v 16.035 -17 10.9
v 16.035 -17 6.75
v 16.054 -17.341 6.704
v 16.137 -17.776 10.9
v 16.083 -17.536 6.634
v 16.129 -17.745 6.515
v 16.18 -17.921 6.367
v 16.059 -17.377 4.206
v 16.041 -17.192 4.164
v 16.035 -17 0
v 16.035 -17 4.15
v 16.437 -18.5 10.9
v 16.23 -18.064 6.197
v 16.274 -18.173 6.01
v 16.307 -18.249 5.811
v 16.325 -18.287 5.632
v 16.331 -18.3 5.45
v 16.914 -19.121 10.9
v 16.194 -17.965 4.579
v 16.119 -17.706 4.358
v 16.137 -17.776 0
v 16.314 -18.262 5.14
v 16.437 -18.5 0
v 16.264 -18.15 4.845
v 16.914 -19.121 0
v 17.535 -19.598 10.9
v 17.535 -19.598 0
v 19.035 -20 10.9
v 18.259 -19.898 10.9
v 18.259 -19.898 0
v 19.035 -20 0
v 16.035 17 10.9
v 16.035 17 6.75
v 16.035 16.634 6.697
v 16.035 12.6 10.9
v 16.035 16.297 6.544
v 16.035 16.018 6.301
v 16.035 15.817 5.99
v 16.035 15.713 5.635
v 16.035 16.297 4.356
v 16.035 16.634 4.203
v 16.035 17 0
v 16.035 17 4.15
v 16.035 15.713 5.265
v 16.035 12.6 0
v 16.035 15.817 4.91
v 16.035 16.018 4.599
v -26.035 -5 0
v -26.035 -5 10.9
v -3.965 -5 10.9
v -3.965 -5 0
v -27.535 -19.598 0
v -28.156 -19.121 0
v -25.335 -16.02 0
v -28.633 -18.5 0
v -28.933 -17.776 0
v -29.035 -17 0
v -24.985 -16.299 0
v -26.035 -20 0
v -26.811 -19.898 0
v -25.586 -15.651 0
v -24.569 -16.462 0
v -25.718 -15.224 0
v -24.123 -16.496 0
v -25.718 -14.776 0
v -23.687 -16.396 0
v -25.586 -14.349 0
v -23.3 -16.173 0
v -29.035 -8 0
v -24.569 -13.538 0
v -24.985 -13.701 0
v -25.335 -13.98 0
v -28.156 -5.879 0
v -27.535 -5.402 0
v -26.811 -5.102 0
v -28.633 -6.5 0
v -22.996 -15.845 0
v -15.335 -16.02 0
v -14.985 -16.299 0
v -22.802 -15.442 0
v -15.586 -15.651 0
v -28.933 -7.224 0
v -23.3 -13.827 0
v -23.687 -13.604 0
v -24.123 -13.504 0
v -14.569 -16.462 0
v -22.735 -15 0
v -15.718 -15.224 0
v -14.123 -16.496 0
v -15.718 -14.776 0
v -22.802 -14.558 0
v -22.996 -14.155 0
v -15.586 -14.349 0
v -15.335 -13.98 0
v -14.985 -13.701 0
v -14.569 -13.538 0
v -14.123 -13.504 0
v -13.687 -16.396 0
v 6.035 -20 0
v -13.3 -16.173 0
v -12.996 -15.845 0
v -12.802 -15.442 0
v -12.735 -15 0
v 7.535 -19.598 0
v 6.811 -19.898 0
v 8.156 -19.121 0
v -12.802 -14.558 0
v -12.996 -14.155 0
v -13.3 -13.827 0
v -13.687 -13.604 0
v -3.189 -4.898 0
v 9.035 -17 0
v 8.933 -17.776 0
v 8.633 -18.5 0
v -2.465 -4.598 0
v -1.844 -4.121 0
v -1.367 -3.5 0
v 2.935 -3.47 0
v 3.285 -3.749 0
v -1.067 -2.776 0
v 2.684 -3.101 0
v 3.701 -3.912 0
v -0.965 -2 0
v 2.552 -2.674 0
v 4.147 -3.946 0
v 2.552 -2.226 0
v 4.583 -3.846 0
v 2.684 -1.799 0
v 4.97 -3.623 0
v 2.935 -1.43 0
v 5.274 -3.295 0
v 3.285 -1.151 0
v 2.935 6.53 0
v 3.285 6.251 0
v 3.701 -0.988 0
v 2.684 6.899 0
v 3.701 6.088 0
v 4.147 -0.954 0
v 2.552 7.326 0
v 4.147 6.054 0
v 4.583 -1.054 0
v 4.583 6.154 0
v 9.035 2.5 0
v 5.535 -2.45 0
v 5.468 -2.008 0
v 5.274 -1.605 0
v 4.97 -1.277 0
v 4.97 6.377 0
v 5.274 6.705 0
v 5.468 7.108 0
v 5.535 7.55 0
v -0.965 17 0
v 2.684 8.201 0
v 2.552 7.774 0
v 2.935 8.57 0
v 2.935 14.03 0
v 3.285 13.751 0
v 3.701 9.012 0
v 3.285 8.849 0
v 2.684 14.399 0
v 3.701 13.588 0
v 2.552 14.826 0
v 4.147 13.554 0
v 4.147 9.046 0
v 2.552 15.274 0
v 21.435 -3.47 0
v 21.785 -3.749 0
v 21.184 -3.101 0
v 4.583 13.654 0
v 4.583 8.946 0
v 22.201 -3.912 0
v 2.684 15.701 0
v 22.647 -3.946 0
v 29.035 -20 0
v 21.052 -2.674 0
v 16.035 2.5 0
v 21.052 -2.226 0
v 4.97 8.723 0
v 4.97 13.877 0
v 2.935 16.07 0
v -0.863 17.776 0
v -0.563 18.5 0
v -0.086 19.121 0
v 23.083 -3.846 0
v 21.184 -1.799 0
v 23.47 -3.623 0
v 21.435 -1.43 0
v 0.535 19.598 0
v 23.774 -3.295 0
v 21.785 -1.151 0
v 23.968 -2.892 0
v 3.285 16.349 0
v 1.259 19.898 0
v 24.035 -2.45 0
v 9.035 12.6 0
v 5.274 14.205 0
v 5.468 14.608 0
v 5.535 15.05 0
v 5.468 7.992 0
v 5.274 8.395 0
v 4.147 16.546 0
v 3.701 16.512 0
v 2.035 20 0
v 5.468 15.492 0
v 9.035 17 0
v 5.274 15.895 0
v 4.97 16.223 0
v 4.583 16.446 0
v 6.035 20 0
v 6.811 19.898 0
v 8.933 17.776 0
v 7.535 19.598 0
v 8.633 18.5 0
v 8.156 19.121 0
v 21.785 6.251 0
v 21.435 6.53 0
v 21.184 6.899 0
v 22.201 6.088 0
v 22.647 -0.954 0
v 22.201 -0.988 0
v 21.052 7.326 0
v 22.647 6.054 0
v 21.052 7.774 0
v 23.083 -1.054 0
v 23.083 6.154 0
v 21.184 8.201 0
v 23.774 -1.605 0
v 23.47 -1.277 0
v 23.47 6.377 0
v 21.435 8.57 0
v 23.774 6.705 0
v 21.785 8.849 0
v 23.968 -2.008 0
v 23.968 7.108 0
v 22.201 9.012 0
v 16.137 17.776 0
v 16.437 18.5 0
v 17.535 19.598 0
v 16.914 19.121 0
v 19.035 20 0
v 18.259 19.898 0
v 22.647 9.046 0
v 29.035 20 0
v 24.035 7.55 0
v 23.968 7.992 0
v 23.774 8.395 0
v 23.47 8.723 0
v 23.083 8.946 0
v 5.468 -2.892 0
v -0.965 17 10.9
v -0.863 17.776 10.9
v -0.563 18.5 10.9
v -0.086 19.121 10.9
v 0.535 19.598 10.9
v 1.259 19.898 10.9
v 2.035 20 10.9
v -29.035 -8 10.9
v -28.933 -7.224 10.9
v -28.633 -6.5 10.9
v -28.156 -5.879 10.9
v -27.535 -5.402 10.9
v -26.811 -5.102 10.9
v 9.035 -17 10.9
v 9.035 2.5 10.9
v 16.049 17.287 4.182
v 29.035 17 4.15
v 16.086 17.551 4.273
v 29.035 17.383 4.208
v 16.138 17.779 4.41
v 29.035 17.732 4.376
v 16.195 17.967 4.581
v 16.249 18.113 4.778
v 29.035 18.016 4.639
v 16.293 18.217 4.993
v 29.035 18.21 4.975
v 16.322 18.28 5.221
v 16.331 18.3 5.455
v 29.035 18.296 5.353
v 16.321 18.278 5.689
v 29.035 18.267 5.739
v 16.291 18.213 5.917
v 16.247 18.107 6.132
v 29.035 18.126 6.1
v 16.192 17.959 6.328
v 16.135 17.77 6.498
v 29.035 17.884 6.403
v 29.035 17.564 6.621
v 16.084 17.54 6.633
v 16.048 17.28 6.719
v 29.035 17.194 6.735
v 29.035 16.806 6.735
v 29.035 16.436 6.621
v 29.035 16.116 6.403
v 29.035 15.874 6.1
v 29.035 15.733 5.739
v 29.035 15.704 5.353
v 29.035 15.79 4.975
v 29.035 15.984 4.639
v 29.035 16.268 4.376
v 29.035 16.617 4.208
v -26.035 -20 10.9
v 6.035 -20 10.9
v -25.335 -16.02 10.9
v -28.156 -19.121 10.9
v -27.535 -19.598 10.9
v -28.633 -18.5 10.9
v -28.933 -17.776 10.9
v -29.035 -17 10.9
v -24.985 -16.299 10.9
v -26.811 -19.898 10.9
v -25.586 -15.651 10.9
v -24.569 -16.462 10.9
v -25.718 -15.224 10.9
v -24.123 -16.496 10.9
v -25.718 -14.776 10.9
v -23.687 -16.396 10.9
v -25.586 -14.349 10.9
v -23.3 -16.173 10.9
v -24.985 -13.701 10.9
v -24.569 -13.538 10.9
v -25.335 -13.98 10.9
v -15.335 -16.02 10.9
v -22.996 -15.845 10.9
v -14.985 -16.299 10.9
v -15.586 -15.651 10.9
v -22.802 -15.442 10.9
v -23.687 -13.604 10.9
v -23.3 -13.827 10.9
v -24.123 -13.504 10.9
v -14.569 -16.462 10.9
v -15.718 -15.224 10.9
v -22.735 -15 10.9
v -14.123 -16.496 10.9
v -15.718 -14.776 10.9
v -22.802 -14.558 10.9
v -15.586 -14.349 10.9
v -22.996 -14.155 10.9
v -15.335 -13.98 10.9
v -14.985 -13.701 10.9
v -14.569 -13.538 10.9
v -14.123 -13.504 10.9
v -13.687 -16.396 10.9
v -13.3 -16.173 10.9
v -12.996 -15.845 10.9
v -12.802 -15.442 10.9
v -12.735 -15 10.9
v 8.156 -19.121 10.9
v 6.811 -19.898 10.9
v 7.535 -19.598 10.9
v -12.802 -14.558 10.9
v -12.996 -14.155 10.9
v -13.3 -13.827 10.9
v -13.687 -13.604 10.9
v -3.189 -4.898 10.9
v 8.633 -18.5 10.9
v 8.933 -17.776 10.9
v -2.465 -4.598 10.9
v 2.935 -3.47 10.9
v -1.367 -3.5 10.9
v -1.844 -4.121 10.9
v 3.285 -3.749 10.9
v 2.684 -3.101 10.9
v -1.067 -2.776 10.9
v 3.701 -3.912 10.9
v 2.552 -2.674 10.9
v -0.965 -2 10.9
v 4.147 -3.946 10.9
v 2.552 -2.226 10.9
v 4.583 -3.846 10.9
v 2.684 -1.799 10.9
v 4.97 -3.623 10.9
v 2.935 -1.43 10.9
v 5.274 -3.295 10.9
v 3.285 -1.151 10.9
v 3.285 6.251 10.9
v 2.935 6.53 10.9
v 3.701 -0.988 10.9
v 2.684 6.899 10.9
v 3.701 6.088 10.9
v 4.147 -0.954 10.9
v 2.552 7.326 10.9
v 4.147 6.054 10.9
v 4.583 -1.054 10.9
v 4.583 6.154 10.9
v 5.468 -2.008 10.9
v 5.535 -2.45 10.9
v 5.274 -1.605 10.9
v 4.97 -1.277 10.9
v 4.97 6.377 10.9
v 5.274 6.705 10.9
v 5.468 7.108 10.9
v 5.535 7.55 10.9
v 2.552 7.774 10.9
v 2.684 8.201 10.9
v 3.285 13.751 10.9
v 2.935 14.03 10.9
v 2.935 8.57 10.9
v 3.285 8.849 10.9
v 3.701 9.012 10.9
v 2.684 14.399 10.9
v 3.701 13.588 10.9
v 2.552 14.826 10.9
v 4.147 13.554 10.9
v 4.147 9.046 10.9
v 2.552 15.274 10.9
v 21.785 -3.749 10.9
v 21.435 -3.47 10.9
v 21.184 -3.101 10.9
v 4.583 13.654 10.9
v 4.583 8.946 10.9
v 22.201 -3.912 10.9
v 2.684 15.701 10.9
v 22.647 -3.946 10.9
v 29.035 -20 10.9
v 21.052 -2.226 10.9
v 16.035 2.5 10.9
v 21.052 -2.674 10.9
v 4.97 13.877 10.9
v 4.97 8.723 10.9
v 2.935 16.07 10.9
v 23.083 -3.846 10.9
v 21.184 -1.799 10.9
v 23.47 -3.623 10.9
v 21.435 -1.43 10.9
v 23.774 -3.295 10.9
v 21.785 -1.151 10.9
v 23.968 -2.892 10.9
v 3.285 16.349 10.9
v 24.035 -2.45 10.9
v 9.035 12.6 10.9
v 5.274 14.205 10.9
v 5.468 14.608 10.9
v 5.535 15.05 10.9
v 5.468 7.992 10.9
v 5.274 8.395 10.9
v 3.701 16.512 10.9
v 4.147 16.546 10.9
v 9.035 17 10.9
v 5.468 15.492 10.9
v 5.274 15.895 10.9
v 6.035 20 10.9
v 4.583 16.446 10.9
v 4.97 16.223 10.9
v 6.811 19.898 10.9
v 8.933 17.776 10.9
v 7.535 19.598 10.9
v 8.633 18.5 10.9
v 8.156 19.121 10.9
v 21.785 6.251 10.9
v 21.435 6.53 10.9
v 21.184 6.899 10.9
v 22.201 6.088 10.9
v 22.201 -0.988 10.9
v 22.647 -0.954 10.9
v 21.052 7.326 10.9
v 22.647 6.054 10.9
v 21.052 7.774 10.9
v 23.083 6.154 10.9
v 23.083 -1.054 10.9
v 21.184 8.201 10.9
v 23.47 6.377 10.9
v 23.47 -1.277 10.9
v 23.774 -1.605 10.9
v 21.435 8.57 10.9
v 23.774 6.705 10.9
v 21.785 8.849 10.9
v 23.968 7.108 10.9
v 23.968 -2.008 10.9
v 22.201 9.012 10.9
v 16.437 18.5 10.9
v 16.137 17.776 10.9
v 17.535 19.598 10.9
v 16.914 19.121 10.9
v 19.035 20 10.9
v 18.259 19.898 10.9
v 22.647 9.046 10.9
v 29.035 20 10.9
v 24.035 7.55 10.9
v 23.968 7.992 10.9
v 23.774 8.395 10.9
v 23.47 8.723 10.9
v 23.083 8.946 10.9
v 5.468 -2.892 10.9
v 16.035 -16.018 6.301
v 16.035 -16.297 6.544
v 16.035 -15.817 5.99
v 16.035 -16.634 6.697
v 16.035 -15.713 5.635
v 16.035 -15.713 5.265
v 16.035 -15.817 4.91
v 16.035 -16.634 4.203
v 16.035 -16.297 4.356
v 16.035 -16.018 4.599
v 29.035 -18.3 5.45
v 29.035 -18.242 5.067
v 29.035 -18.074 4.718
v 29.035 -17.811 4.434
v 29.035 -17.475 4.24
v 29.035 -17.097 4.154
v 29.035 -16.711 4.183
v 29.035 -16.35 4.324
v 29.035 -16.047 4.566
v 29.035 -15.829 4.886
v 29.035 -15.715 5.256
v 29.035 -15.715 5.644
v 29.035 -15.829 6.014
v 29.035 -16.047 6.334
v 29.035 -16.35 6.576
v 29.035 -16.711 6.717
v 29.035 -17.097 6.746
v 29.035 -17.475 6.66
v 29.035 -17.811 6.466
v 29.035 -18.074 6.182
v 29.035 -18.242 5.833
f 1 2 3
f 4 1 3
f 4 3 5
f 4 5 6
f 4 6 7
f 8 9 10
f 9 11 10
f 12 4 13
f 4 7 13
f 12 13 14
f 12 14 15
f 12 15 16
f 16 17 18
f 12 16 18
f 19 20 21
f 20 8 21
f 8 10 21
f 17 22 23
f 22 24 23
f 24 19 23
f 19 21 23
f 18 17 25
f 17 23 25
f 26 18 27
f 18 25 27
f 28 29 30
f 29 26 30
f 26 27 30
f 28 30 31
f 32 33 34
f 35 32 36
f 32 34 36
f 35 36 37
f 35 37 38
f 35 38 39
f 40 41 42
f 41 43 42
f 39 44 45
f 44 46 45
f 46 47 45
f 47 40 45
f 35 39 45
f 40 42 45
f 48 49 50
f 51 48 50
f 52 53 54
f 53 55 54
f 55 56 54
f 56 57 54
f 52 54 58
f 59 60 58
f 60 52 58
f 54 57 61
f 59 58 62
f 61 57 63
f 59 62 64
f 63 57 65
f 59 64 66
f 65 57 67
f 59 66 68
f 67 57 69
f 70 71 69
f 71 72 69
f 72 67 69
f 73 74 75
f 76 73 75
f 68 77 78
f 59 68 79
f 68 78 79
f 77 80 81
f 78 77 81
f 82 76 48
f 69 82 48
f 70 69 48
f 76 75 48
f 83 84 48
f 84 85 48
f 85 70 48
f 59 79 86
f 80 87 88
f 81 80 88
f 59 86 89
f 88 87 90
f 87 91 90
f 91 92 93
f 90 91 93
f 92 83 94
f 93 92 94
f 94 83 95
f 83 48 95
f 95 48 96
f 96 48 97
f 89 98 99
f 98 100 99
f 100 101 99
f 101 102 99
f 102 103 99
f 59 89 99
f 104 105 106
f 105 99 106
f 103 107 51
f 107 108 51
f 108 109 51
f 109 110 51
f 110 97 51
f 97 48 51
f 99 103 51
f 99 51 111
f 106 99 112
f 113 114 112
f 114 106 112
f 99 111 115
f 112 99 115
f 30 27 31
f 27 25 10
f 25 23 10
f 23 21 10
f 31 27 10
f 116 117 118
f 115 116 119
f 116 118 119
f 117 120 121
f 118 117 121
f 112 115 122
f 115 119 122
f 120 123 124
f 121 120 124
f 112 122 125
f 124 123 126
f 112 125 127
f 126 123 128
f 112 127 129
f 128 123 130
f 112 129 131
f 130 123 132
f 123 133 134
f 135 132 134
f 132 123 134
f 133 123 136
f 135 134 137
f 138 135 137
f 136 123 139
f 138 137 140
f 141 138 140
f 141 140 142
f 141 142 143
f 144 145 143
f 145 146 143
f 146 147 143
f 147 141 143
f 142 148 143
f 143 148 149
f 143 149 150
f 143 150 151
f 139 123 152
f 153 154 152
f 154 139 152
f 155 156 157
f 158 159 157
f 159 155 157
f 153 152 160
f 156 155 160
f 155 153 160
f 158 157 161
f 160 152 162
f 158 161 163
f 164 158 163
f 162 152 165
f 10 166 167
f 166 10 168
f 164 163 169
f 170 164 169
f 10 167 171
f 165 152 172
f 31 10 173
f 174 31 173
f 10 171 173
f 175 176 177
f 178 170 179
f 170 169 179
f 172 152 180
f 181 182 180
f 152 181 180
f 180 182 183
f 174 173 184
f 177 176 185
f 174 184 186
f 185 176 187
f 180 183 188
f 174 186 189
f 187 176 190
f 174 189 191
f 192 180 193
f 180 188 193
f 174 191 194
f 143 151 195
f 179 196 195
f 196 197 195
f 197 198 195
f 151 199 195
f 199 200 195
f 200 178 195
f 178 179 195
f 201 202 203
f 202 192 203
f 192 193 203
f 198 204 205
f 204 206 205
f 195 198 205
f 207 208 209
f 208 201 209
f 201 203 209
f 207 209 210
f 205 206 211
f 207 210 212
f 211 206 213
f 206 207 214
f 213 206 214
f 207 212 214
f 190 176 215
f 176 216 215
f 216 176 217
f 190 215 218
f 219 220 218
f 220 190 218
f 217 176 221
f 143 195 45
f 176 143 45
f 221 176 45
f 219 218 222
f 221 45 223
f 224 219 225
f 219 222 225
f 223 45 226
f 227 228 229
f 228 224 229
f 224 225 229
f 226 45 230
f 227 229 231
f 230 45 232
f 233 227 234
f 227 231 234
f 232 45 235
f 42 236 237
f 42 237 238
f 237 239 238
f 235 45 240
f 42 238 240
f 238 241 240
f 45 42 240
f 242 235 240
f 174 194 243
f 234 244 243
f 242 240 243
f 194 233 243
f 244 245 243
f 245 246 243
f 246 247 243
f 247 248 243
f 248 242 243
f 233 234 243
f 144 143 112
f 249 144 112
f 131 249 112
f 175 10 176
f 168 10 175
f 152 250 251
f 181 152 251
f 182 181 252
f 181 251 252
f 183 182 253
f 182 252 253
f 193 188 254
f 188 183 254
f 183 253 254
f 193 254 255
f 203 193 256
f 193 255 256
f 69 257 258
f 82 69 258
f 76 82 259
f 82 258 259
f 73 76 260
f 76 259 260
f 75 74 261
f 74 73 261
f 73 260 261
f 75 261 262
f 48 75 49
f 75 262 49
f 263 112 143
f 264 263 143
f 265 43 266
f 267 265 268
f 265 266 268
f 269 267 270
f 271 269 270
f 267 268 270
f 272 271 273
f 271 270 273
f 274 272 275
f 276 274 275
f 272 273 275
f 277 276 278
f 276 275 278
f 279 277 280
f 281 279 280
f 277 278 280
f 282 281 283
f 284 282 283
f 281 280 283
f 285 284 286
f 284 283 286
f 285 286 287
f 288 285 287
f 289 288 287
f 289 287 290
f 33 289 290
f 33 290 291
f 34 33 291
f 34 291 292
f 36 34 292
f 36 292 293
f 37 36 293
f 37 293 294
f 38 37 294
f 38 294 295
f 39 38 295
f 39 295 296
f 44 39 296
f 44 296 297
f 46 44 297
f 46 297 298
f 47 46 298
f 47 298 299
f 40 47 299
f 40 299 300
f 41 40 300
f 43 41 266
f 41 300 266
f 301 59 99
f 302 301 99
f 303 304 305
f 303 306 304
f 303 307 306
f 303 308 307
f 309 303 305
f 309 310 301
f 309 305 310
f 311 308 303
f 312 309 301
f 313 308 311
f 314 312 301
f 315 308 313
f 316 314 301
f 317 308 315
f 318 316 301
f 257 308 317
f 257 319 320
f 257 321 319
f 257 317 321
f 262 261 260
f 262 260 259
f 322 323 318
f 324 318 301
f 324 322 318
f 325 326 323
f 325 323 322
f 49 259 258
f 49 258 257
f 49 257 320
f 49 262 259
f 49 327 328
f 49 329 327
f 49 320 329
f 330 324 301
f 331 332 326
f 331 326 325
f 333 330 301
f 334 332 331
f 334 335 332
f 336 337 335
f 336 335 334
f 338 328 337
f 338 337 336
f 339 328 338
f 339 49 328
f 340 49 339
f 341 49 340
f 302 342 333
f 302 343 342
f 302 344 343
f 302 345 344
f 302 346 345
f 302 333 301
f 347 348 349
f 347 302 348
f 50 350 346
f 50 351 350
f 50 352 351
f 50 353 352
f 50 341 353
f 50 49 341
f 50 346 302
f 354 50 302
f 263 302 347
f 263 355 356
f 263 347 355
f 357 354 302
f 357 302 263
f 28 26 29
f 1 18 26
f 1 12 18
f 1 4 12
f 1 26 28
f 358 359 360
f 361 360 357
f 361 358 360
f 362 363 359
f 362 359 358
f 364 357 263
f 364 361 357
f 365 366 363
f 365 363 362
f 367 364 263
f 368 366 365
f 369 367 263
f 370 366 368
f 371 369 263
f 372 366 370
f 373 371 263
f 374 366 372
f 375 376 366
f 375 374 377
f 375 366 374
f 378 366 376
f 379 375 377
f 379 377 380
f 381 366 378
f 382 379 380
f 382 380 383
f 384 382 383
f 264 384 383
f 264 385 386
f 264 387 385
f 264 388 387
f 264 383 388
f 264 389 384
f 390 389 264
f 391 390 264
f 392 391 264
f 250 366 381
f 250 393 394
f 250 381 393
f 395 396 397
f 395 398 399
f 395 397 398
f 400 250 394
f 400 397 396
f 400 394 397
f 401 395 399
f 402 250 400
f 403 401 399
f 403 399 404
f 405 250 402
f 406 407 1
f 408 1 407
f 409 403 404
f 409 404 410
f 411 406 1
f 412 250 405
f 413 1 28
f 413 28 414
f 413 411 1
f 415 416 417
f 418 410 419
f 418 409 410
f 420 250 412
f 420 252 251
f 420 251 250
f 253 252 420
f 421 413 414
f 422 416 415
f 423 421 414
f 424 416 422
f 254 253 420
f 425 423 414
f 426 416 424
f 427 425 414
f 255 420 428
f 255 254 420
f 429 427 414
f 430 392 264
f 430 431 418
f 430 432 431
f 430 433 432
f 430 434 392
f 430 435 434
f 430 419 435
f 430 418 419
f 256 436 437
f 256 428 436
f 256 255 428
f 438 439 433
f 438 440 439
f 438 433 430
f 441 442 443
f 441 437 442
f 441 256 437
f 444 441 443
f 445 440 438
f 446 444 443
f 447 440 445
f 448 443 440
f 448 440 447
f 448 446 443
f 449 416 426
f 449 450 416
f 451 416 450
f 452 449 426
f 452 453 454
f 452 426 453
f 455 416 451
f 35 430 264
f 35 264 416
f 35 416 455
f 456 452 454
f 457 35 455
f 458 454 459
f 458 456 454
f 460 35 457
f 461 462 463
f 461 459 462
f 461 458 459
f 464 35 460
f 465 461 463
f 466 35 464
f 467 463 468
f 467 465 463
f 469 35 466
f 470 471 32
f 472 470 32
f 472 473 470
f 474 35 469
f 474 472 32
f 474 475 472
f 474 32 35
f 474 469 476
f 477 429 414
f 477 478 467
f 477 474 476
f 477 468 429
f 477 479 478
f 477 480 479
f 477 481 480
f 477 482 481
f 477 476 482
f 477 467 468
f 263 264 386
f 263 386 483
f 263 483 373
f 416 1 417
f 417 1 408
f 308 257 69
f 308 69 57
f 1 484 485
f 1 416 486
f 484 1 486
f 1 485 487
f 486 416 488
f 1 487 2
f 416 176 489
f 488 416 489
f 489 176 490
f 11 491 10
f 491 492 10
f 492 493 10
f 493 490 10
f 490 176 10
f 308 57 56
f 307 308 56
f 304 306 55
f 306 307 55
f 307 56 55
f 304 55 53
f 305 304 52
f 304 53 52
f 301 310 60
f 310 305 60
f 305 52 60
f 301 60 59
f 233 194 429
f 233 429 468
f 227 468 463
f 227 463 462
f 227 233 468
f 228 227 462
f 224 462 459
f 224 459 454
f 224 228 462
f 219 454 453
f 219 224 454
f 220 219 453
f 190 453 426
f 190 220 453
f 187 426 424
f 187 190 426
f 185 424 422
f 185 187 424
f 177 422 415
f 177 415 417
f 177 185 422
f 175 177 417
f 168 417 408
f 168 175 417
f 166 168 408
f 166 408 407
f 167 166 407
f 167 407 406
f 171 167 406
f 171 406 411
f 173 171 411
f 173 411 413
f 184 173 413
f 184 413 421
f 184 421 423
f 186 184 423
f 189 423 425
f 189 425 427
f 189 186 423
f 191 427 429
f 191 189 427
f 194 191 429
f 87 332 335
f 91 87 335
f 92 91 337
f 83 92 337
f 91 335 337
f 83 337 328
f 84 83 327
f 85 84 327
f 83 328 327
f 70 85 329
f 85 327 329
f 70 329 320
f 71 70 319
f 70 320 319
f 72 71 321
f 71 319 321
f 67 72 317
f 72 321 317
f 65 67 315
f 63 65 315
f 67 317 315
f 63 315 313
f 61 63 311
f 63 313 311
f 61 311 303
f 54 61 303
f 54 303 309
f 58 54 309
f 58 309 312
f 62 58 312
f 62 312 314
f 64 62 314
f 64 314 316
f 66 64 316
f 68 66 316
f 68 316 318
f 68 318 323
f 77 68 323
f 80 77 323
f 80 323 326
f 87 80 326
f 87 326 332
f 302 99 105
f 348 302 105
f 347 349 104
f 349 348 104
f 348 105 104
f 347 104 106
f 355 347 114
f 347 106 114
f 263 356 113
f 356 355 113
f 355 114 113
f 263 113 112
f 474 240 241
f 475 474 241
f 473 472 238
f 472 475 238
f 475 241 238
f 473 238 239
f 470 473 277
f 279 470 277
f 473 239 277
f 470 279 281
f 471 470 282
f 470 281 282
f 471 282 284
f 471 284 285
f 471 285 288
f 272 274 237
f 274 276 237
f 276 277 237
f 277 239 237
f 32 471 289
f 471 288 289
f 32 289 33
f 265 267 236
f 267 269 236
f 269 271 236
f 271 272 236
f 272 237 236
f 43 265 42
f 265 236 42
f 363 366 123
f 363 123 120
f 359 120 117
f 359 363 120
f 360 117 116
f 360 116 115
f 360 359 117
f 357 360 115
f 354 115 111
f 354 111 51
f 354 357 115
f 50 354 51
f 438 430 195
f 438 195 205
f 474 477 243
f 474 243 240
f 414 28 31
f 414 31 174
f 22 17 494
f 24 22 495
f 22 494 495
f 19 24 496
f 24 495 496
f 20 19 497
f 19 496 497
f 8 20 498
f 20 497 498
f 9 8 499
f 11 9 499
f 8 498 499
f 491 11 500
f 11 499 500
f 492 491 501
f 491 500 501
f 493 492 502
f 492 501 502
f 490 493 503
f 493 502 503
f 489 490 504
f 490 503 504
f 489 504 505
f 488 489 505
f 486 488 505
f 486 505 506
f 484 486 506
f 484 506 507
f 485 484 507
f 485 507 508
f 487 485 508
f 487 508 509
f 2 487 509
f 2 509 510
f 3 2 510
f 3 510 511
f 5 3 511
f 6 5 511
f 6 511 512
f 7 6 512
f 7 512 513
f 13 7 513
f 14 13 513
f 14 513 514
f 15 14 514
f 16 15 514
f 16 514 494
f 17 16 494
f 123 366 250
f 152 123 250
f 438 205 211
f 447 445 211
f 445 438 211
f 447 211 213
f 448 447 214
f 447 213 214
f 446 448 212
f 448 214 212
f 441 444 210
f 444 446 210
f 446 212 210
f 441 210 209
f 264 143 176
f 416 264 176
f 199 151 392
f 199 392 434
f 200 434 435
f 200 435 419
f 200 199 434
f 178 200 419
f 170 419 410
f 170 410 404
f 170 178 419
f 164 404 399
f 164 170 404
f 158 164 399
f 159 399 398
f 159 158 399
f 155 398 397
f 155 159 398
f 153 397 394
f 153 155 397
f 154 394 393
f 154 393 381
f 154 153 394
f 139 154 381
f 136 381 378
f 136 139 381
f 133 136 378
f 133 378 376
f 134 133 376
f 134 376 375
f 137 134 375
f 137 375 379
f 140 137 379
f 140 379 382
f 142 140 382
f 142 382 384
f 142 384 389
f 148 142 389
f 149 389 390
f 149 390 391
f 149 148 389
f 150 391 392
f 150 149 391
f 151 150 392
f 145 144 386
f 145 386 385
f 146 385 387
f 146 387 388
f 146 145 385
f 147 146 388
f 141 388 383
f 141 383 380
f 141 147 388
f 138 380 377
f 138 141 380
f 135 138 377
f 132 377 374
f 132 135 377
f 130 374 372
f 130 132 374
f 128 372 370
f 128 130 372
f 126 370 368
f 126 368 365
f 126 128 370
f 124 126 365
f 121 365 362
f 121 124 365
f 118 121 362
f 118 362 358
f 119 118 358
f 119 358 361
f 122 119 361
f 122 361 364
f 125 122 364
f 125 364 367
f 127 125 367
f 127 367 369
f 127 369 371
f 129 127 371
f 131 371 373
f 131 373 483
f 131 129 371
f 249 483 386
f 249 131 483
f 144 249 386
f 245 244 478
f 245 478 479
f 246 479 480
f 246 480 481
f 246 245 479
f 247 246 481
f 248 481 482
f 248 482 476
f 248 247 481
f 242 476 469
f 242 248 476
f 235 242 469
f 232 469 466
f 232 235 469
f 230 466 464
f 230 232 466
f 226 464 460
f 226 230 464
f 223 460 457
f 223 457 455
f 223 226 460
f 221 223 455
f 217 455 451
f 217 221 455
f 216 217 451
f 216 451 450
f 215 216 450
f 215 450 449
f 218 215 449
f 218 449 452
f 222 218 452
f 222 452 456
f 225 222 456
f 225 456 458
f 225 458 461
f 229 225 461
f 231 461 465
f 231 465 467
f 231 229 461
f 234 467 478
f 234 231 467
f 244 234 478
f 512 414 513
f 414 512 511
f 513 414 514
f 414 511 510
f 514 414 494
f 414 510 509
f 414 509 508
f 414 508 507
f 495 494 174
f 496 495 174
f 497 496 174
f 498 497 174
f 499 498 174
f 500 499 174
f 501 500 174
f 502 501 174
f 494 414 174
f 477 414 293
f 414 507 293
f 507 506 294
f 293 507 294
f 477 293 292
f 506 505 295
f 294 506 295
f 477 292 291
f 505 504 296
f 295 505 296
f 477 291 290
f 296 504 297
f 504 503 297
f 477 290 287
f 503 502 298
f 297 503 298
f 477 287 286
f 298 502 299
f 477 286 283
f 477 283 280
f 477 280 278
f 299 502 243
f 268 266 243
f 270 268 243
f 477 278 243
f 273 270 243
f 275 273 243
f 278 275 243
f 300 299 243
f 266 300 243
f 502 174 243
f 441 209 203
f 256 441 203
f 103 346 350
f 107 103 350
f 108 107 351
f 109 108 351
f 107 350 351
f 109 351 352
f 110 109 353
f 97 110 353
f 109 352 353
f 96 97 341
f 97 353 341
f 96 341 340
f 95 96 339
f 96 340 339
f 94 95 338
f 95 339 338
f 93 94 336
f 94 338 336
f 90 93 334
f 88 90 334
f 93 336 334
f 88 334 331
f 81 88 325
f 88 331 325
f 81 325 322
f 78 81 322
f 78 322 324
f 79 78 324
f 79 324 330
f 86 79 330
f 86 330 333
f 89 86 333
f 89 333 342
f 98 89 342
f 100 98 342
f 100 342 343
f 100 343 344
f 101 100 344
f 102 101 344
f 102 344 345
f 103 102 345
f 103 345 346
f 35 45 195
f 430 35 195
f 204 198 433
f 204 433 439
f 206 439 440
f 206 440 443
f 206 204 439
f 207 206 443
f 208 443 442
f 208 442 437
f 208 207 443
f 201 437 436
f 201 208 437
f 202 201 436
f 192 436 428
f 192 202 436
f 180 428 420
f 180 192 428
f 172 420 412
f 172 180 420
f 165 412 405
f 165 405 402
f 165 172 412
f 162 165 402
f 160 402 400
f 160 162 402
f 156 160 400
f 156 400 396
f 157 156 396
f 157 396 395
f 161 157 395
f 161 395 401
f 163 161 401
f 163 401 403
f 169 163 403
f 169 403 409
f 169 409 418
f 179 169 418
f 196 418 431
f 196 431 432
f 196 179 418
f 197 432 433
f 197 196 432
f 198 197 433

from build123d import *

# Parameters (mm, degrees)
SKETCH_1_R          = 1.5
EXTRUDE_1_DEPTH     = 10.9
SKETCH_2_R          = 1.3
CUT_EXTRUDE_1_DEPTH = 13
SKETCH_5_R          = 5.1
CUT_EXTRUDE_3_DEPTH = 37.903132997
SKETCH_6_R          = 1.5
CUT_EXTRUDE_4_DEPTH = 37.903132997
SKETCH_7_W          = 28.07
SKETCH_7_H          = 25
CUT_EXTRUDE_5_DEPTH = 37.903132997
FILLET_2_R          = 3


with BuildPart() as part:
    # ｽｹｯﾁ1 → ﾎﾞｽ - 押し出し1 (new body)
    with BuildSketch(Plane.XY):
        Polygon((9.035, 12.6), (9.035, 20), (-29.035, 20), (-29.035, -20), (9.035, -20), (9.035, 2.5), (16.035, 2.5), (16.035, -20), (29.035, -20), (29.035, 20), (16.035, 20), (16.035, 12.6), align=None)
        with Locations((4.035, -2.45)):
            Circle(SKETCH_1_R, mode=Mode.SUBTRACT)
        with Locations((22.535, -2.45)):
            Circle(SKETCH_1_R, mode=Mode.SUBTRACT)
        with Locations((4.035, 7.55)):
            Circle(SKETCH_1_R, mode=Mode.SUBTRACT)
        with Locations((22.535, 7.55)):
            Circle(SKETCH_1_R, mode=Mode.SUBTRACT)
        with Locations((4.035, 15.05)):
            Circle(SKETCH_1_R, mode=Mode.SUBTRACT)
    extrude(amount=EXTRUDE_1_DEPTH)

    # ｽｹｯﾁ2 → ｶｯﾄ - 押し出し1 (cut)
    with BuildSketch(Plane(origin=(29.035, 0, 0), x_dir=(0, 0, -1), z_dir=(1, 0, 0))):
        with Locations((-5.45, 17)):
            Circle(SKETCH_2_R)
        with Locations(Location((-5.45, -17, 0), (0, 0, 270))):
            Circle(SKETCH_2_R)
    extrude(amount=-CUT_EXTRUDE_1_DEPTH, mode=Mode.SUBTRACT)

    # ｽｹｯﾁ5 → ｶｯﾄ - 押し出し3 (cut, through all)
    with BuildSketch(Plane.XY.offset(10.9)):
        with Locations((-29.035, 24)):
            Circle(SKETCH_5_R)
        with Locations((-8.935, 24)):
            Circle(SKETCH_5_R)
    extrude(amount=-CUT_EXTRUDE_3_DEPTH, mode=Mode.SUBTRACT)

    # ｽｹｯﾁ6 → ｶｯﾄ - 押し出し4 (cut, through all)
    with BuildSketch(Plane.XY.offset(10.9)):
        with Locations((-24.235, -15)):
            Circle(SKETCH_6_R)
        with Locations((-14.235, -15)):
            Circle(SKETCH_6_R)
    extrude(amount=-CUT_EXTRUDE_4_DEPTH, mode=Mode.SUBTRACT)

    # ｽｹｯﾁ7 → ｶｯﾄ - 押し出し5 (cut, through all)
    with BuildSketch(Plane.XY.offset(10.9)):
        with Locations((-15, 7.5)):
            Rectangle(SKETCH_7_W, SKETCH_7_H)
    extrude(amount=-CUT_EXTRUDE_5_DEPTH, mode=Mode.SUBTRACT)

    # ﾌｨﾚｯﾄ2
    # the kernel refuses this fillet: 3 mm, written as the material it adds along each edge
    with BuildSketch(Plane(origin=(-0.965, -5, 10.9), x_dir=(-1, 0, 0), z_dir=(0, 0, -1))) as fillet_2_piece_1:
        with BuildLine():
            CenterArc((FILLET_2_R, FILLET_2_R), FILLET_2_R, 180, 90)
            Line((0, FILLET_2_R), (0, 0))
            Line((0, 0), (FILLET_2_R, 0))
        make_face()
    extrude(amount=10.9)
    # the kernel refuses this fillet: 3 mm, written as the material it takes off along each edge
    with BuildSketch(Plane(origin=(-29.035, -5, 18.4), x_dir=(0, -1, 0), z_dir=(0, 0, -1)), Plane(origin=(-0.965, 20, 18.4), x_dir=(0, -1, 0), z_dir=(0, 0, -1))) as fillet_2_2_piece_1:
        with BuildLine():
            CenterArc((FILLET_2_R, -FILLET_2_R), FILLET_2_R, 90, 90)
            Line((0, -FILLET_2_R), (0, 0))
            Line((0, 0), (FILLET_2_R, 0))
        make_face()
    extrude(amount=25.9, mode=Mode.SUBTRACT)
    with BuildSketch(Plane(origin=(9.035, -20, -7.5), x_dir=(0, 1, 0), z_dir=(0, 0, 1)), Plane(origin=(-29.035, -20, -7.5), x_dir=(1, 0, 0), z_dir=(0, 0, 1)), Plane(origin=(9.035, 20, -7.5), x_dir=(-1, 0, 0), z_dir=(0, 0, 1)), Plane(origin=(16.035, 20, -7.5), x_dir=(0, -1, 0), z_dir=(0, 0, 1)), Plane(origin=(16.035, -20, -7.5), x_dir=(1, 0, 0), z_dir=(0, 0, 1))) as fillet_2_2_piece_2:
        with BuildLine():
            CenterArc((FILLET_2_R, FILLET_2_R), FILLET_2_R, 180, 90)
            Line((0, FILLET_2_R), (0, 0))
            Line((0, 0), (FILLET_2_R, 0))
        make_face()
    extrude(amount=25.9, mode=Mode.SUBTRACT)


solid = part.part
